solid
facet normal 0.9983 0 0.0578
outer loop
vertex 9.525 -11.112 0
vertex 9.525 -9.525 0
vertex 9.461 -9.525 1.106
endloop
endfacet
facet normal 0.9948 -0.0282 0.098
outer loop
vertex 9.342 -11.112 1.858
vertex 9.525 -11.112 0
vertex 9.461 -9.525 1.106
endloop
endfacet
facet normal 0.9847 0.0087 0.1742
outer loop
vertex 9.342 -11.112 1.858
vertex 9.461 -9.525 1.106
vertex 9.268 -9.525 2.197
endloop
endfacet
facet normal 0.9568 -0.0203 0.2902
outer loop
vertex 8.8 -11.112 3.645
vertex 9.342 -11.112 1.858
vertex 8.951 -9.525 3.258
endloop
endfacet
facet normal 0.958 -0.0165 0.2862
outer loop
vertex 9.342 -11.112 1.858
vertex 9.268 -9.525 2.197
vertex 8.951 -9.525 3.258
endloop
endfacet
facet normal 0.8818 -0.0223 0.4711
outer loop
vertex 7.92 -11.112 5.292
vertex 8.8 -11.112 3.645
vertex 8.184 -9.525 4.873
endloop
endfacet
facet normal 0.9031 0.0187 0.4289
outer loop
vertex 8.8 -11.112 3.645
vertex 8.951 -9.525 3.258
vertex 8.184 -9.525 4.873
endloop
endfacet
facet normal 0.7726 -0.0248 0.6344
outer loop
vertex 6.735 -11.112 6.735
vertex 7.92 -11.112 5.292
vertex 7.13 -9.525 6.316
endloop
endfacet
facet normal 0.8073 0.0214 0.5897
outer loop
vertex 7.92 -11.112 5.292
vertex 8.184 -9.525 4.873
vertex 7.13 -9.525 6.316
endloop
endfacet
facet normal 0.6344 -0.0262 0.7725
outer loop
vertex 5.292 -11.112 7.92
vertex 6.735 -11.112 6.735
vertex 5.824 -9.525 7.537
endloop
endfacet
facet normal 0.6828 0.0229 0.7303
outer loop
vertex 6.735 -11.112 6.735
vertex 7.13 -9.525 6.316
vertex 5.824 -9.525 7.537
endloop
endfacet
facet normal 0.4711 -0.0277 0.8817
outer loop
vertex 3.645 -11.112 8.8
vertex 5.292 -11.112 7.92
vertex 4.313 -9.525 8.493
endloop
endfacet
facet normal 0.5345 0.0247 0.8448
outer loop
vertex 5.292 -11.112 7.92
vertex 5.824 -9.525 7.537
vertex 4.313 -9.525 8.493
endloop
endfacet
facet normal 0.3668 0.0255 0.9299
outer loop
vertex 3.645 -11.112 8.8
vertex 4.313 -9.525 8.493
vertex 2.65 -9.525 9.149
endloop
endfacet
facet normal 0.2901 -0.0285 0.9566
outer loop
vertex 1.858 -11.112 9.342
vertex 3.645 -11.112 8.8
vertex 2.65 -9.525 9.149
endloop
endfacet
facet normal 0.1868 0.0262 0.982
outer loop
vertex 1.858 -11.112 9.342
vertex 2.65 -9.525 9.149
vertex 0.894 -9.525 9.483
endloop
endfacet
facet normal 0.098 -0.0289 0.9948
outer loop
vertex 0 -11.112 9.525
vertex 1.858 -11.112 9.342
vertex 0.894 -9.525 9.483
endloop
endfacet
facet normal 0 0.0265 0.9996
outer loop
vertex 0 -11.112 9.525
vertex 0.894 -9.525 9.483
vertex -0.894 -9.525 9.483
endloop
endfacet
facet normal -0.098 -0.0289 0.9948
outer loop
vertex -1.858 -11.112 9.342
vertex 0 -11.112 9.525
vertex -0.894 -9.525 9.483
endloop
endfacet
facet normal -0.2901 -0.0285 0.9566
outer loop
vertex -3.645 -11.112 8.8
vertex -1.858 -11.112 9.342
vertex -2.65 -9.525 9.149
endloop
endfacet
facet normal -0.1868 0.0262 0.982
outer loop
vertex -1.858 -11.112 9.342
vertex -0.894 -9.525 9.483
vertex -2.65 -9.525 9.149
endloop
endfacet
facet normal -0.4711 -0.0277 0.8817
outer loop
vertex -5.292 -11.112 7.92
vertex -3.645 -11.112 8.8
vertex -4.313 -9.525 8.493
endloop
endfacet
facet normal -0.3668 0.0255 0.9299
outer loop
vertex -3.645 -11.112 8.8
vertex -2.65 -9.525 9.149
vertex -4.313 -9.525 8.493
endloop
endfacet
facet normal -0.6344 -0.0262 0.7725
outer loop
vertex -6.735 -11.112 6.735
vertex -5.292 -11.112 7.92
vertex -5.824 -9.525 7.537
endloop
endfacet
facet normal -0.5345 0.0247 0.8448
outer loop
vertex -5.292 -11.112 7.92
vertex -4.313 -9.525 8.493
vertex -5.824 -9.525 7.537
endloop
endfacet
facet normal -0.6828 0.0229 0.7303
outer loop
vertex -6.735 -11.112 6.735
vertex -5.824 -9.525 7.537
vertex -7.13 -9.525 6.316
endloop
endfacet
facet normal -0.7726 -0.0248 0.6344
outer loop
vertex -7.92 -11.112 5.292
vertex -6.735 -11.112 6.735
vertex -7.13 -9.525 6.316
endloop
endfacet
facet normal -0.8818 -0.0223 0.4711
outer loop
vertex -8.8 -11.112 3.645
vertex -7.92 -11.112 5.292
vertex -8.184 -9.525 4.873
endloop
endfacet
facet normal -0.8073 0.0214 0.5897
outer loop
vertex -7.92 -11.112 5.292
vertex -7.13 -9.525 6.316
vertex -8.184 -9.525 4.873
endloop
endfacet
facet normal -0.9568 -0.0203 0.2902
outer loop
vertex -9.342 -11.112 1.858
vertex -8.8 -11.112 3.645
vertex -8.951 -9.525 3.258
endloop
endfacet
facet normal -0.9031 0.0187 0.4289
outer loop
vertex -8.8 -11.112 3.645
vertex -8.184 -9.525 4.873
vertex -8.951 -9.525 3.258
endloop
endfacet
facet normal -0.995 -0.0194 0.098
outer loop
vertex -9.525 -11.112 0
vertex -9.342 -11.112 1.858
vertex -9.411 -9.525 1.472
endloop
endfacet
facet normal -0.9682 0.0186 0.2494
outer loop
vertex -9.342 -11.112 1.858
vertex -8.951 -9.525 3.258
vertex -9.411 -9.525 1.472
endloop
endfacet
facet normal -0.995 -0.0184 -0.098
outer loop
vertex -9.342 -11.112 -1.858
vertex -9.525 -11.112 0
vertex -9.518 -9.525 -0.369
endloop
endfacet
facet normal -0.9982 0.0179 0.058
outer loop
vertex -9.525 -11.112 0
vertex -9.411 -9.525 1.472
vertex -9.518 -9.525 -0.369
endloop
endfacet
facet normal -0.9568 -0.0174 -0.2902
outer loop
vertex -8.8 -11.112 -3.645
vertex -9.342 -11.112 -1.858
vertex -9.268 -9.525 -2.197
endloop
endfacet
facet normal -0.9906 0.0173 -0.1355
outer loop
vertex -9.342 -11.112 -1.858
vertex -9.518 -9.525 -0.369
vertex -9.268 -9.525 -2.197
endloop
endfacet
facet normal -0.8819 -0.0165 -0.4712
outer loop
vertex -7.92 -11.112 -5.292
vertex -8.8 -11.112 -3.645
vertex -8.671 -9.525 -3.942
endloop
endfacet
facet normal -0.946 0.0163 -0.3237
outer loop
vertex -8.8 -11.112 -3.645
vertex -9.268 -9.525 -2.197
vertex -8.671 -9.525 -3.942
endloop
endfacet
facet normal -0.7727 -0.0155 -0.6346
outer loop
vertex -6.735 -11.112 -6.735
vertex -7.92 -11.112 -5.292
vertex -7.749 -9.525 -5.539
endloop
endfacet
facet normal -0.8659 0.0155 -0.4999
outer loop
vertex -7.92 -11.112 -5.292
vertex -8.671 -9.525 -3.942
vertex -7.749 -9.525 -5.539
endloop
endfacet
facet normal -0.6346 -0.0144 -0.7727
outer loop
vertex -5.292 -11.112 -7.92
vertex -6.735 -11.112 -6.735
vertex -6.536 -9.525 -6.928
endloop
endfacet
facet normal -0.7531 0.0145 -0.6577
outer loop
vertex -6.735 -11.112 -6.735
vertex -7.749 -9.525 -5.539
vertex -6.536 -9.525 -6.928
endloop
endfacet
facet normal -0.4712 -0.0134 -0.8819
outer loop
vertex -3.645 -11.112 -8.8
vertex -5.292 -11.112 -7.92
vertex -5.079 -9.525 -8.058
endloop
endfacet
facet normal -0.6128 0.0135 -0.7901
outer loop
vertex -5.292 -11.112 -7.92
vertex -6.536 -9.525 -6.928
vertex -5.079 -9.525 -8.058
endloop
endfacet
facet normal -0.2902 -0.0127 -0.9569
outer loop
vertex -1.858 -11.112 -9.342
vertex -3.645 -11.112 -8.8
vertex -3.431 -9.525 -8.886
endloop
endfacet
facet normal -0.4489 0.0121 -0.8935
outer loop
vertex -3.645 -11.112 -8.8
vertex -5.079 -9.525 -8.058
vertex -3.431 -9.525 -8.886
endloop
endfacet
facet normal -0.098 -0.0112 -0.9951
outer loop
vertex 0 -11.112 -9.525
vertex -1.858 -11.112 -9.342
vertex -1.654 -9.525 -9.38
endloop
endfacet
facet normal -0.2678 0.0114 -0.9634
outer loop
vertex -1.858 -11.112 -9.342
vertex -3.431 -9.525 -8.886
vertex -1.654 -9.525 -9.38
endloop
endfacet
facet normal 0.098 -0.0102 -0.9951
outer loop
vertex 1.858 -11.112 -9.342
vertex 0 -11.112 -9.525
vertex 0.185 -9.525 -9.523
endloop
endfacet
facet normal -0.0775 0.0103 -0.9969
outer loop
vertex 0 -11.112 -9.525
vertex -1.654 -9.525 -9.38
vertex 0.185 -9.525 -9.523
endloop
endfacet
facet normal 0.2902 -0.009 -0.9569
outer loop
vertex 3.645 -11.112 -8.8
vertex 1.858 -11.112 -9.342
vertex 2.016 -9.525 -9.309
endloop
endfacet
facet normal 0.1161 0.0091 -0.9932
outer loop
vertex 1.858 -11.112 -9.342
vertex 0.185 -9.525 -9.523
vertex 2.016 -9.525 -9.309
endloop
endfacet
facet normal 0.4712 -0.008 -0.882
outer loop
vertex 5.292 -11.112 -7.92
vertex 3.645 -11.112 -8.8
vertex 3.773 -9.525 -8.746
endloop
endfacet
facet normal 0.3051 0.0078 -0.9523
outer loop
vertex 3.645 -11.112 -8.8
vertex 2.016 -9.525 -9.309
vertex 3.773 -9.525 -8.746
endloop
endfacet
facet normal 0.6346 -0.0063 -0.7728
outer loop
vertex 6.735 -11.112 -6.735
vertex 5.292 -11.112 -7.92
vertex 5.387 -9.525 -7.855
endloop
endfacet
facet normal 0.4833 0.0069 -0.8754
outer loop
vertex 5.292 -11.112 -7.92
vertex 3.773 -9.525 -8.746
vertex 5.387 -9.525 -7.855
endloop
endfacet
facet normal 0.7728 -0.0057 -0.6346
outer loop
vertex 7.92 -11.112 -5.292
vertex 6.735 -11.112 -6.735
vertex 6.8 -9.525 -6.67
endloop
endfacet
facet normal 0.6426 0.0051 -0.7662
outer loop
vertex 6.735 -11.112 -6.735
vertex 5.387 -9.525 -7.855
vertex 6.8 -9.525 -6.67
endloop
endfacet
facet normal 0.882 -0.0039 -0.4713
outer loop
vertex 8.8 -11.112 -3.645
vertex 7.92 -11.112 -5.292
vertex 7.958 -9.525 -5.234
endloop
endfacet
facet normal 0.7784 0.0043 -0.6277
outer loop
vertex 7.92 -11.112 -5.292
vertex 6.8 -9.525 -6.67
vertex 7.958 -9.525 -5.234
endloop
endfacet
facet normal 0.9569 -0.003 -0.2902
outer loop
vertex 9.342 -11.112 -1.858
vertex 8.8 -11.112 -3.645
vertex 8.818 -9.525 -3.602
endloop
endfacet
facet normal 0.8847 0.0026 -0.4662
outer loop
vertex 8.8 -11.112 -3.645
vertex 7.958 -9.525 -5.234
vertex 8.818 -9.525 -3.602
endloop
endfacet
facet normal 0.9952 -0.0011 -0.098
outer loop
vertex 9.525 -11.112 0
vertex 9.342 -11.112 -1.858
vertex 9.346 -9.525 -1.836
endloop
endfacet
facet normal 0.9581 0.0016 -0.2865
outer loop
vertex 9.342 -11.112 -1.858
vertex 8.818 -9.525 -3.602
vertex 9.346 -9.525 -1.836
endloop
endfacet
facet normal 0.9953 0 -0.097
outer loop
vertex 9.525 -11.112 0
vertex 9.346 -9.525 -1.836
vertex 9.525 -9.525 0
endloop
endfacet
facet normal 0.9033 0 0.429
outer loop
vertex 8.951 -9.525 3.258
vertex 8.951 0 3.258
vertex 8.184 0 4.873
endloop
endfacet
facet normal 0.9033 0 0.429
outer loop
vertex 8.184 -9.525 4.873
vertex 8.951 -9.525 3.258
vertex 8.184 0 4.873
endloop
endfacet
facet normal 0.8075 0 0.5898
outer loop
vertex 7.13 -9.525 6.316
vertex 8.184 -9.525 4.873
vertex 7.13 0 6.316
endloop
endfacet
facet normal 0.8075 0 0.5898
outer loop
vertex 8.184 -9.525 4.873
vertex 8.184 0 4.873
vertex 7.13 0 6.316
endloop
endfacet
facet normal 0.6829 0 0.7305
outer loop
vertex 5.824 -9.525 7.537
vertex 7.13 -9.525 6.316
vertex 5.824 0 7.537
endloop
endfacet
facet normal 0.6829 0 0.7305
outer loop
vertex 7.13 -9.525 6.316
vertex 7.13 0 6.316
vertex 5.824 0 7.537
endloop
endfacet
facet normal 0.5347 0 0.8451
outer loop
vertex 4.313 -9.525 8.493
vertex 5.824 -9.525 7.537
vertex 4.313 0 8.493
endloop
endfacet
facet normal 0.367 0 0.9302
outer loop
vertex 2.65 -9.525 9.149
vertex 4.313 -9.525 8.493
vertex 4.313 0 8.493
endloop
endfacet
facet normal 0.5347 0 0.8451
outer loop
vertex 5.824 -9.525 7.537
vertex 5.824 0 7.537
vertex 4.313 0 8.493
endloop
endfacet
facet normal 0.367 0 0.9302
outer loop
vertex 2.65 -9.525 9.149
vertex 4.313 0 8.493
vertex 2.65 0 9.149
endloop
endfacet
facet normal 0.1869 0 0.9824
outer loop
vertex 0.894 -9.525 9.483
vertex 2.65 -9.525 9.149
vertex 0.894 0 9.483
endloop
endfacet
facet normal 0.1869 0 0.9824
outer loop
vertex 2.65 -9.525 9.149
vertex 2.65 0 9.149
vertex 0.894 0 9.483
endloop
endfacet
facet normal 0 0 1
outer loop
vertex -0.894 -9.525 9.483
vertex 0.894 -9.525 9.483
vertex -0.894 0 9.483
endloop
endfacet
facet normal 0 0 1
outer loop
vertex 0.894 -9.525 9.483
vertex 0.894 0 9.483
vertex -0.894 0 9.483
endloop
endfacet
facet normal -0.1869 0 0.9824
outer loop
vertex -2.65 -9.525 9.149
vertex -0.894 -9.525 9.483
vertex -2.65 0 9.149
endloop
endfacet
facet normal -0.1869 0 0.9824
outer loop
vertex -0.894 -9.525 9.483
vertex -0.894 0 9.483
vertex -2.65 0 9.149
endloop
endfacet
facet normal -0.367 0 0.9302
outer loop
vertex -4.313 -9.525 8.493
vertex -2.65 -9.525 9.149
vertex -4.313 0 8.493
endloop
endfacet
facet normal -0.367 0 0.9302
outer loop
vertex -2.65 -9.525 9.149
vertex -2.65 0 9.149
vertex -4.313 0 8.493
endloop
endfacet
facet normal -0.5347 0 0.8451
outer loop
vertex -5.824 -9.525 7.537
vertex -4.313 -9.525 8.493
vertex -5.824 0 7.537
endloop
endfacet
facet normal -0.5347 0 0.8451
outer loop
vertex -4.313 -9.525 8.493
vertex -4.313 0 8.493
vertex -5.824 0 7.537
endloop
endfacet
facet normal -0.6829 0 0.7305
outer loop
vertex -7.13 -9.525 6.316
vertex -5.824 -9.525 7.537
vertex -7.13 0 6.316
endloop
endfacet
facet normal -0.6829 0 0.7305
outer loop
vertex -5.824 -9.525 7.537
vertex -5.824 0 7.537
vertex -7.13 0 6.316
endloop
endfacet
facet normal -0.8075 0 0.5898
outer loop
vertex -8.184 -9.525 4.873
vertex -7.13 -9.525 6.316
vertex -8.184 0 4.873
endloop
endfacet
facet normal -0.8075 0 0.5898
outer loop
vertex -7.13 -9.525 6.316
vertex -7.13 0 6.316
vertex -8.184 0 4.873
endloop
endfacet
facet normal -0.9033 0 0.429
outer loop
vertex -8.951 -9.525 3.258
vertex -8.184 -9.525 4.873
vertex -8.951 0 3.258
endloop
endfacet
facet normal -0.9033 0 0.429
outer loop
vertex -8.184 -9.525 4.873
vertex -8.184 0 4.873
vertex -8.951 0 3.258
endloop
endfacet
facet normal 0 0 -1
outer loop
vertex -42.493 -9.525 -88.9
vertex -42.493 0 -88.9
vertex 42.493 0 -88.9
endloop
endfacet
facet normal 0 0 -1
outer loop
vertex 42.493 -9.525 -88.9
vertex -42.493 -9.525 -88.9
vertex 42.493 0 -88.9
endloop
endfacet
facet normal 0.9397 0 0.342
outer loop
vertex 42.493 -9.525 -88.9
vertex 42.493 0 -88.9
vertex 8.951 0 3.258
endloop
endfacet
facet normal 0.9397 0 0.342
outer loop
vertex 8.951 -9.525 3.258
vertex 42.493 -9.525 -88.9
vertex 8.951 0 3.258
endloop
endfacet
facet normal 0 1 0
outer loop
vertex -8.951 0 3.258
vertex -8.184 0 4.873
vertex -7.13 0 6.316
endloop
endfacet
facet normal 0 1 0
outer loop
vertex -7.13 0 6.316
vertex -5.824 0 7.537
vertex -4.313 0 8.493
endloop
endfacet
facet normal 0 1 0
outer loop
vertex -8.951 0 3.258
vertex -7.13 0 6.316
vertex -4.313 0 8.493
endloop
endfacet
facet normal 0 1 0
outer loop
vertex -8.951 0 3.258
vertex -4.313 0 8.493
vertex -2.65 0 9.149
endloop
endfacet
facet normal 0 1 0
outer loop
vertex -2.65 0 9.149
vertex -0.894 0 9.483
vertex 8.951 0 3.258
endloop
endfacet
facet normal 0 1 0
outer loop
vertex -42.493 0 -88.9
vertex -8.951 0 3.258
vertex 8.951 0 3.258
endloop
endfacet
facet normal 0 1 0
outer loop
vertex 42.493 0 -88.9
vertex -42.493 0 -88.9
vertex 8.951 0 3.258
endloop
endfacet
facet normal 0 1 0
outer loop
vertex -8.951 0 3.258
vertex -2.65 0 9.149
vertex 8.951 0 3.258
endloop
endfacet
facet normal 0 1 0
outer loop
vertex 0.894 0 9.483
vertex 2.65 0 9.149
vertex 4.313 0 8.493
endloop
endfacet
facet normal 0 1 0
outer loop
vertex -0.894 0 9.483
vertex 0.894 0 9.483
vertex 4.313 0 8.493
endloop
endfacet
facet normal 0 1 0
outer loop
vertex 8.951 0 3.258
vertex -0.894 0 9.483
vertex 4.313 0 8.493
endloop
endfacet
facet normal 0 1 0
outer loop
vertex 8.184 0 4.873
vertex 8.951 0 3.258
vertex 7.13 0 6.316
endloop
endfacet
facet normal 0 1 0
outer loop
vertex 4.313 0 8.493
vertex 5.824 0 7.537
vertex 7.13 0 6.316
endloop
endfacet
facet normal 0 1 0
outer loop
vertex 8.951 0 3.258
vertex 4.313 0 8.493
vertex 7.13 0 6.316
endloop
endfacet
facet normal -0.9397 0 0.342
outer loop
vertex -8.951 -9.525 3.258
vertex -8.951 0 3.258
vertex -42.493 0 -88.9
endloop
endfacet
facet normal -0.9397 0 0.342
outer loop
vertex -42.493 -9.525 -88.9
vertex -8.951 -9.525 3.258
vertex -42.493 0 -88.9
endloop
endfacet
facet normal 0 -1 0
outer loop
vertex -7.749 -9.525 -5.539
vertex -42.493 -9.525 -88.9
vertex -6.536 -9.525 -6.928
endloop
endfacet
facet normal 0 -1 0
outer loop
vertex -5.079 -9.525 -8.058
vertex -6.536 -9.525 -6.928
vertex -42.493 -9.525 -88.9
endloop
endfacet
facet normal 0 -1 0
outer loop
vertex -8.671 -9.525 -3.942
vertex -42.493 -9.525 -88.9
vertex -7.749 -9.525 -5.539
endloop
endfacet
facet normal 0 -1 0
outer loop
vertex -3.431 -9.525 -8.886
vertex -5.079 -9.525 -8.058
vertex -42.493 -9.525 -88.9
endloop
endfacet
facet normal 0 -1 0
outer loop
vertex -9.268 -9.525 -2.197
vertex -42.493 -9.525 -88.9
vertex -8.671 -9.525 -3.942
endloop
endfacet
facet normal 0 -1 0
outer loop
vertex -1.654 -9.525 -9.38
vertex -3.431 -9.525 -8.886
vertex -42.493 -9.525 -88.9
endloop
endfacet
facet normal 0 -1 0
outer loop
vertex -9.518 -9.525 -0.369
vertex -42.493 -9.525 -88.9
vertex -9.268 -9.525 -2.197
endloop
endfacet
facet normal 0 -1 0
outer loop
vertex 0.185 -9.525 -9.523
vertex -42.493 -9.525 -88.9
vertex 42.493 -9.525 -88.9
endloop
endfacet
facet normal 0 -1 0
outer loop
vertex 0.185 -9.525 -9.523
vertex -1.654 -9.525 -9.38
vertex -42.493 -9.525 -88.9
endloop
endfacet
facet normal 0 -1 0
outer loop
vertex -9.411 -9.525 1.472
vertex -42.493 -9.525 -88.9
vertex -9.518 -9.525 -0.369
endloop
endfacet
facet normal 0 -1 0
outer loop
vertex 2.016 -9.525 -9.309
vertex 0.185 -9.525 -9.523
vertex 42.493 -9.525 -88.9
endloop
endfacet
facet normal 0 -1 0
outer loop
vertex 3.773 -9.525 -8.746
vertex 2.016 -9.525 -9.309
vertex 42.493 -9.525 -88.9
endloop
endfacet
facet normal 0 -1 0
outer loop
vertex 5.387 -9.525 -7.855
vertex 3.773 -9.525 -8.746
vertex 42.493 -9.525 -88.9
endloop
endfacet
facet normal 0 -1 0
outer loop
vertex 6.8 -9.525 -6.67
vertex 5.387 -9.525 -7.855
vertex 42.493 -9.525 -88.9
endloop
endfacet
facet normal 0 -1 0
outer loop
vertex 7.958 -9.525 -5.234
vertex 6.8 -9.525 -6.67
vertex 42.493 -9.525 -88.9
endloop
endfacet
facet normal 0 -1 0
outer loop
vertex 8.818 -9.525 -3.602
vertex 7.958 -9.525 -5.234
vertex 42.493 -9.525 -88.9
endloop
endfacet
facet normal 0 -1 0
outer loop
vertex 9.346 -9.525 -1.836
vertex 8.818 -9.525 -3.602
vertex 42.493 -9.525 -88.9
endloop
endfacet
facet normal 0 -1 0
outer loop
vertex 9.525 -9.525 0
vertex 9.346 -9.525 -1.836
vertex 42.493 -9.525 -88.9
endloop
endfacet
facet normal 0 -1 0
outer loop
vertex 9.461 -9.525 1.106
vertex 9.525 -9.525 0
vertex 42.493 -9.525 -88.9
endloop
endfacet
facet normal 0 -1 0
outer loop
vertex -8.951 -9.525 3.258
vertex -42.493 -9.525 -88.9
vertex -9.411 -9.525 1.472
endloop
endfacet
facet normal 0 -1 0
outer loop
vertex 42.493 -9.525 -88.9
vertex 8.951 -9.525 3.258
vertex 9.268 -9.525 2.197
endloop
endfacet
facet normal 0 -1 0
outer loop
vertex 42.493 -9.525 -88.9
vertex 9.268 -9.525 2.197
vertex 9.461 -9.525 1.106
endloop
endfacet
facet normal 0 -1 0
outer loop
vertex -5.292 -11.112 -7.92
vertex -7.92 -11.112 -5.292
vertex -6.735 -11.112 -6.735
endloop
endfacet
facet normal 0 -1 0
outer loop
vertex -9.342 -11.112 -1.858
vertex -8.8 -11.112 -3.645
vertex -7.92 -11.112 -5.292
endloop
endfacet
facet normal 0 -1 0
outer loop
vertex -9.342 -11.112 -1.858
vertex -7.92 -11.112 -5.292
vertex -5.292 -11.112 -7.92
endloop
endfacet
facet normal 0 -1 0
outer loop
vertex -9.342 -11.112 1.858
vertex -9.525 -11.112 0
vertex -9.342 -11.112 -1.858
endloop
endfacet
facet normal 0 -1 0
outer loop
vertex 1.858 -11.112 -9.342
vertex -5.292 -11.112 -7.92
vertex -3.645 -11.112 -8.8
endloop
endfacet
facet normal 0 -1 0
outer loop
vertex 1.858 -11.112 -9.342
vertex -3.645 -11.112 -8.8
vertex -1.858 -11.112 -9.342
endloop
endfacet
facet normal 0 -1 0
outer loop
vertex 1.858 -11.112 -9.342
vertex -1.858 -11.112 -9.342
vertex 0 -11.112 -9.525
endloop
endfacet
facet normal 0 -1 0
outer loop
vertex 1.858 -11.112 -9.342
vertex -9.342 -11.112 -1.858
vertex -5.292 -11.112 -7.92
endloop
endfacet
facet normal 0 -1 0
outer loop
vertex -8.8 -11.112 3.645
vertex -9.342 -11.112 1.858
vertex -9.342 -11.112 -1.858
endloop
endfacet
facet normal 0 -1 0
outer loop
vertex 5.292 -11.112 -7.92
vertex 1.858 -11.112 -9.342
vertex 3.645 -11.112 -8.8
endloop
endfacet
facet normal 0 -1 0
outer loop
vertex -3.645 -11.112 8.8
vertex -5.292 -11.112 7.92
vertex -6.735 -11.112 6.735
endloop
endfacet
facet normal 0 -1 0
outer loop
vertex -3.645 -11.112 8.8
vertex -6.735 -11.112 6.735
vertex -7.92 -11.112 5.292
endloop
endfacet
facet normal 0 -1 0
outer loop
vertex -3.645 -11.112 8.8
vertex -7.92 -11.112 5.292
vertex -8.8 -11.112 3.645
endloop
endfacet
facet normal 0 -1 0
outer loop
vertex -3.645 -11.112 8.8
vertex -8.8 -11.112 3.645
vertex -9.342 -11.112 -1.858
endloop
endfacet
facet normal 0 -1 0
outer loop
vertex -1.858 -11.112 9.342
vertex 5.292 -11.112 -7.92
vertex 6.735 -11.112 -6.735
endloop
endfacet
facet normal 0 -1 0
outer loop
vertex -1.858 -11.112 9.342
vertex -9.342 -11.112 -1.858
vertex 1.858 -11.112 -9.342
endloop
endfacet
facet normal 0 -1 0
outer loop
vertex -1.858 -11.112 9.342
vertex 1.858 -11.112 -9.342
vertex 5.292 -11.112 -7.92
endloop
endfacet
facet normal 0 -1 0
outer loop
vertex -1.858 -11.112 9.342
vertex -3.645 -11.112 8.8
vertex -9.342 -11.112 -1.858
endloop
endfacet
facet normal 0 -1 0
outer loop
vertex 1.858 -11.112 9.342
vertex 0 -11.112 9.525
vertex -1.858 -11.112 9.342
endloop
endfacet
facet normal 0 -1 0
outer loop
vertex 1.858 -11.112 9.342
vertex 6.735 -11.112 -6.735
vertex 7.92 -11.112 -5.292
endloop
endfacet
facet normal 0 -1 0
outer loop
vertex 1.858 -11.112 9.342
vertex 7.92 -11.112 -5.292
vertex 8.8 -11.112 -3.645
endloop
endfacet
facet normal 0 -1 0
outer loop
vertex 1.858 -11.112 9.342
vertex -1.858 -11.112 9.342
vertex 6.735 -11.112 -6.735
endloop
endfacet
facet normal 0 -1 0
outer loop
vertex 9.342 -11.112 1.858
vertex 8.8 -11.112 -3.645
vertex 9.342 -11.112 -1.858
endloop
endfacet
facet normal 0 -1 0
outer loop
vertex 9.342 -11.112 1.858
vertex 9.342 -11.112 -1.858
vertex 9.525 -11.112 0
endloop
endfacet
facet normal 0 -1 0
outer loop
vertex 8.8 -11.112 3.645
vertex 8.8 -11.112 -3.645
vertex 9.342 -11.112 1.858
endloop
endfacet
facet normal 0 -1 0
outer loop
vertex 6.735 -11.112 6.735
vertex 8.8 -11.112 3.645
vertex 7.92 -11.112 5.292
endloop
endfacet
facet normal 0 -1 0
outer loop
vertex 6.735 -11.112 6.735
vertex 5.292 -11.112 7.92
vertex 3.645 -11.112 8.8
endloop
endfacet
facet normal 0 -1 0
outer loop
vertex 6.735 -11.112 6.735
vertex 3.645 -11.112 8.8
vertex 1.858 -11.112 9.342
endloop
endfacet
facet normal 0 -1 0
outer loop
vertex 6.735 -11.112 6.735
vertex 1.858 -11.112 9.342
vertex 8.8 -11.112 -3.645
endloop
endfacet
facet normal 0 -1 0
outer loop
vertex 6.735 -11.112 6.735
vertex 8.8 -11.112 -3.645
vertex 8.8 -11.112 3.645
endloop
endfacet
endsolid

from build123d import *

# Parameters (mm, degrees)
F1_DEPTH = 9.525
F2_R     = 9.525
F3_DEPTH = 1.5875


with BuildPart() as f1:
    # F0 (on Front) → F1 (new body)
    with BuildSketch(Plane.XZ):
        with BuildLine():
            Line((42.493247, -88.9), (8.950572, 3.257742))
            ThreePointArc((8.950572, 3.257742), (0, 9.525), (-8.950572, 3.257742))
            Line((-8.950572, 3.257742), (-42.493247, -88.9))
            Line((-42.493247, -88.9), (0, -88.9))
            Line((0, -88.9), (42.493247, -88.9))
        make_face()
    extrude(amount=F1_DEPTH)

    # F2 (on face) → F3 (join)
    with BuildSketch(Plane.XZ.offset(9.525)):
        Circle(F2_R)
    extrude(amount=F3_DEPTH)


solid = f1.part
